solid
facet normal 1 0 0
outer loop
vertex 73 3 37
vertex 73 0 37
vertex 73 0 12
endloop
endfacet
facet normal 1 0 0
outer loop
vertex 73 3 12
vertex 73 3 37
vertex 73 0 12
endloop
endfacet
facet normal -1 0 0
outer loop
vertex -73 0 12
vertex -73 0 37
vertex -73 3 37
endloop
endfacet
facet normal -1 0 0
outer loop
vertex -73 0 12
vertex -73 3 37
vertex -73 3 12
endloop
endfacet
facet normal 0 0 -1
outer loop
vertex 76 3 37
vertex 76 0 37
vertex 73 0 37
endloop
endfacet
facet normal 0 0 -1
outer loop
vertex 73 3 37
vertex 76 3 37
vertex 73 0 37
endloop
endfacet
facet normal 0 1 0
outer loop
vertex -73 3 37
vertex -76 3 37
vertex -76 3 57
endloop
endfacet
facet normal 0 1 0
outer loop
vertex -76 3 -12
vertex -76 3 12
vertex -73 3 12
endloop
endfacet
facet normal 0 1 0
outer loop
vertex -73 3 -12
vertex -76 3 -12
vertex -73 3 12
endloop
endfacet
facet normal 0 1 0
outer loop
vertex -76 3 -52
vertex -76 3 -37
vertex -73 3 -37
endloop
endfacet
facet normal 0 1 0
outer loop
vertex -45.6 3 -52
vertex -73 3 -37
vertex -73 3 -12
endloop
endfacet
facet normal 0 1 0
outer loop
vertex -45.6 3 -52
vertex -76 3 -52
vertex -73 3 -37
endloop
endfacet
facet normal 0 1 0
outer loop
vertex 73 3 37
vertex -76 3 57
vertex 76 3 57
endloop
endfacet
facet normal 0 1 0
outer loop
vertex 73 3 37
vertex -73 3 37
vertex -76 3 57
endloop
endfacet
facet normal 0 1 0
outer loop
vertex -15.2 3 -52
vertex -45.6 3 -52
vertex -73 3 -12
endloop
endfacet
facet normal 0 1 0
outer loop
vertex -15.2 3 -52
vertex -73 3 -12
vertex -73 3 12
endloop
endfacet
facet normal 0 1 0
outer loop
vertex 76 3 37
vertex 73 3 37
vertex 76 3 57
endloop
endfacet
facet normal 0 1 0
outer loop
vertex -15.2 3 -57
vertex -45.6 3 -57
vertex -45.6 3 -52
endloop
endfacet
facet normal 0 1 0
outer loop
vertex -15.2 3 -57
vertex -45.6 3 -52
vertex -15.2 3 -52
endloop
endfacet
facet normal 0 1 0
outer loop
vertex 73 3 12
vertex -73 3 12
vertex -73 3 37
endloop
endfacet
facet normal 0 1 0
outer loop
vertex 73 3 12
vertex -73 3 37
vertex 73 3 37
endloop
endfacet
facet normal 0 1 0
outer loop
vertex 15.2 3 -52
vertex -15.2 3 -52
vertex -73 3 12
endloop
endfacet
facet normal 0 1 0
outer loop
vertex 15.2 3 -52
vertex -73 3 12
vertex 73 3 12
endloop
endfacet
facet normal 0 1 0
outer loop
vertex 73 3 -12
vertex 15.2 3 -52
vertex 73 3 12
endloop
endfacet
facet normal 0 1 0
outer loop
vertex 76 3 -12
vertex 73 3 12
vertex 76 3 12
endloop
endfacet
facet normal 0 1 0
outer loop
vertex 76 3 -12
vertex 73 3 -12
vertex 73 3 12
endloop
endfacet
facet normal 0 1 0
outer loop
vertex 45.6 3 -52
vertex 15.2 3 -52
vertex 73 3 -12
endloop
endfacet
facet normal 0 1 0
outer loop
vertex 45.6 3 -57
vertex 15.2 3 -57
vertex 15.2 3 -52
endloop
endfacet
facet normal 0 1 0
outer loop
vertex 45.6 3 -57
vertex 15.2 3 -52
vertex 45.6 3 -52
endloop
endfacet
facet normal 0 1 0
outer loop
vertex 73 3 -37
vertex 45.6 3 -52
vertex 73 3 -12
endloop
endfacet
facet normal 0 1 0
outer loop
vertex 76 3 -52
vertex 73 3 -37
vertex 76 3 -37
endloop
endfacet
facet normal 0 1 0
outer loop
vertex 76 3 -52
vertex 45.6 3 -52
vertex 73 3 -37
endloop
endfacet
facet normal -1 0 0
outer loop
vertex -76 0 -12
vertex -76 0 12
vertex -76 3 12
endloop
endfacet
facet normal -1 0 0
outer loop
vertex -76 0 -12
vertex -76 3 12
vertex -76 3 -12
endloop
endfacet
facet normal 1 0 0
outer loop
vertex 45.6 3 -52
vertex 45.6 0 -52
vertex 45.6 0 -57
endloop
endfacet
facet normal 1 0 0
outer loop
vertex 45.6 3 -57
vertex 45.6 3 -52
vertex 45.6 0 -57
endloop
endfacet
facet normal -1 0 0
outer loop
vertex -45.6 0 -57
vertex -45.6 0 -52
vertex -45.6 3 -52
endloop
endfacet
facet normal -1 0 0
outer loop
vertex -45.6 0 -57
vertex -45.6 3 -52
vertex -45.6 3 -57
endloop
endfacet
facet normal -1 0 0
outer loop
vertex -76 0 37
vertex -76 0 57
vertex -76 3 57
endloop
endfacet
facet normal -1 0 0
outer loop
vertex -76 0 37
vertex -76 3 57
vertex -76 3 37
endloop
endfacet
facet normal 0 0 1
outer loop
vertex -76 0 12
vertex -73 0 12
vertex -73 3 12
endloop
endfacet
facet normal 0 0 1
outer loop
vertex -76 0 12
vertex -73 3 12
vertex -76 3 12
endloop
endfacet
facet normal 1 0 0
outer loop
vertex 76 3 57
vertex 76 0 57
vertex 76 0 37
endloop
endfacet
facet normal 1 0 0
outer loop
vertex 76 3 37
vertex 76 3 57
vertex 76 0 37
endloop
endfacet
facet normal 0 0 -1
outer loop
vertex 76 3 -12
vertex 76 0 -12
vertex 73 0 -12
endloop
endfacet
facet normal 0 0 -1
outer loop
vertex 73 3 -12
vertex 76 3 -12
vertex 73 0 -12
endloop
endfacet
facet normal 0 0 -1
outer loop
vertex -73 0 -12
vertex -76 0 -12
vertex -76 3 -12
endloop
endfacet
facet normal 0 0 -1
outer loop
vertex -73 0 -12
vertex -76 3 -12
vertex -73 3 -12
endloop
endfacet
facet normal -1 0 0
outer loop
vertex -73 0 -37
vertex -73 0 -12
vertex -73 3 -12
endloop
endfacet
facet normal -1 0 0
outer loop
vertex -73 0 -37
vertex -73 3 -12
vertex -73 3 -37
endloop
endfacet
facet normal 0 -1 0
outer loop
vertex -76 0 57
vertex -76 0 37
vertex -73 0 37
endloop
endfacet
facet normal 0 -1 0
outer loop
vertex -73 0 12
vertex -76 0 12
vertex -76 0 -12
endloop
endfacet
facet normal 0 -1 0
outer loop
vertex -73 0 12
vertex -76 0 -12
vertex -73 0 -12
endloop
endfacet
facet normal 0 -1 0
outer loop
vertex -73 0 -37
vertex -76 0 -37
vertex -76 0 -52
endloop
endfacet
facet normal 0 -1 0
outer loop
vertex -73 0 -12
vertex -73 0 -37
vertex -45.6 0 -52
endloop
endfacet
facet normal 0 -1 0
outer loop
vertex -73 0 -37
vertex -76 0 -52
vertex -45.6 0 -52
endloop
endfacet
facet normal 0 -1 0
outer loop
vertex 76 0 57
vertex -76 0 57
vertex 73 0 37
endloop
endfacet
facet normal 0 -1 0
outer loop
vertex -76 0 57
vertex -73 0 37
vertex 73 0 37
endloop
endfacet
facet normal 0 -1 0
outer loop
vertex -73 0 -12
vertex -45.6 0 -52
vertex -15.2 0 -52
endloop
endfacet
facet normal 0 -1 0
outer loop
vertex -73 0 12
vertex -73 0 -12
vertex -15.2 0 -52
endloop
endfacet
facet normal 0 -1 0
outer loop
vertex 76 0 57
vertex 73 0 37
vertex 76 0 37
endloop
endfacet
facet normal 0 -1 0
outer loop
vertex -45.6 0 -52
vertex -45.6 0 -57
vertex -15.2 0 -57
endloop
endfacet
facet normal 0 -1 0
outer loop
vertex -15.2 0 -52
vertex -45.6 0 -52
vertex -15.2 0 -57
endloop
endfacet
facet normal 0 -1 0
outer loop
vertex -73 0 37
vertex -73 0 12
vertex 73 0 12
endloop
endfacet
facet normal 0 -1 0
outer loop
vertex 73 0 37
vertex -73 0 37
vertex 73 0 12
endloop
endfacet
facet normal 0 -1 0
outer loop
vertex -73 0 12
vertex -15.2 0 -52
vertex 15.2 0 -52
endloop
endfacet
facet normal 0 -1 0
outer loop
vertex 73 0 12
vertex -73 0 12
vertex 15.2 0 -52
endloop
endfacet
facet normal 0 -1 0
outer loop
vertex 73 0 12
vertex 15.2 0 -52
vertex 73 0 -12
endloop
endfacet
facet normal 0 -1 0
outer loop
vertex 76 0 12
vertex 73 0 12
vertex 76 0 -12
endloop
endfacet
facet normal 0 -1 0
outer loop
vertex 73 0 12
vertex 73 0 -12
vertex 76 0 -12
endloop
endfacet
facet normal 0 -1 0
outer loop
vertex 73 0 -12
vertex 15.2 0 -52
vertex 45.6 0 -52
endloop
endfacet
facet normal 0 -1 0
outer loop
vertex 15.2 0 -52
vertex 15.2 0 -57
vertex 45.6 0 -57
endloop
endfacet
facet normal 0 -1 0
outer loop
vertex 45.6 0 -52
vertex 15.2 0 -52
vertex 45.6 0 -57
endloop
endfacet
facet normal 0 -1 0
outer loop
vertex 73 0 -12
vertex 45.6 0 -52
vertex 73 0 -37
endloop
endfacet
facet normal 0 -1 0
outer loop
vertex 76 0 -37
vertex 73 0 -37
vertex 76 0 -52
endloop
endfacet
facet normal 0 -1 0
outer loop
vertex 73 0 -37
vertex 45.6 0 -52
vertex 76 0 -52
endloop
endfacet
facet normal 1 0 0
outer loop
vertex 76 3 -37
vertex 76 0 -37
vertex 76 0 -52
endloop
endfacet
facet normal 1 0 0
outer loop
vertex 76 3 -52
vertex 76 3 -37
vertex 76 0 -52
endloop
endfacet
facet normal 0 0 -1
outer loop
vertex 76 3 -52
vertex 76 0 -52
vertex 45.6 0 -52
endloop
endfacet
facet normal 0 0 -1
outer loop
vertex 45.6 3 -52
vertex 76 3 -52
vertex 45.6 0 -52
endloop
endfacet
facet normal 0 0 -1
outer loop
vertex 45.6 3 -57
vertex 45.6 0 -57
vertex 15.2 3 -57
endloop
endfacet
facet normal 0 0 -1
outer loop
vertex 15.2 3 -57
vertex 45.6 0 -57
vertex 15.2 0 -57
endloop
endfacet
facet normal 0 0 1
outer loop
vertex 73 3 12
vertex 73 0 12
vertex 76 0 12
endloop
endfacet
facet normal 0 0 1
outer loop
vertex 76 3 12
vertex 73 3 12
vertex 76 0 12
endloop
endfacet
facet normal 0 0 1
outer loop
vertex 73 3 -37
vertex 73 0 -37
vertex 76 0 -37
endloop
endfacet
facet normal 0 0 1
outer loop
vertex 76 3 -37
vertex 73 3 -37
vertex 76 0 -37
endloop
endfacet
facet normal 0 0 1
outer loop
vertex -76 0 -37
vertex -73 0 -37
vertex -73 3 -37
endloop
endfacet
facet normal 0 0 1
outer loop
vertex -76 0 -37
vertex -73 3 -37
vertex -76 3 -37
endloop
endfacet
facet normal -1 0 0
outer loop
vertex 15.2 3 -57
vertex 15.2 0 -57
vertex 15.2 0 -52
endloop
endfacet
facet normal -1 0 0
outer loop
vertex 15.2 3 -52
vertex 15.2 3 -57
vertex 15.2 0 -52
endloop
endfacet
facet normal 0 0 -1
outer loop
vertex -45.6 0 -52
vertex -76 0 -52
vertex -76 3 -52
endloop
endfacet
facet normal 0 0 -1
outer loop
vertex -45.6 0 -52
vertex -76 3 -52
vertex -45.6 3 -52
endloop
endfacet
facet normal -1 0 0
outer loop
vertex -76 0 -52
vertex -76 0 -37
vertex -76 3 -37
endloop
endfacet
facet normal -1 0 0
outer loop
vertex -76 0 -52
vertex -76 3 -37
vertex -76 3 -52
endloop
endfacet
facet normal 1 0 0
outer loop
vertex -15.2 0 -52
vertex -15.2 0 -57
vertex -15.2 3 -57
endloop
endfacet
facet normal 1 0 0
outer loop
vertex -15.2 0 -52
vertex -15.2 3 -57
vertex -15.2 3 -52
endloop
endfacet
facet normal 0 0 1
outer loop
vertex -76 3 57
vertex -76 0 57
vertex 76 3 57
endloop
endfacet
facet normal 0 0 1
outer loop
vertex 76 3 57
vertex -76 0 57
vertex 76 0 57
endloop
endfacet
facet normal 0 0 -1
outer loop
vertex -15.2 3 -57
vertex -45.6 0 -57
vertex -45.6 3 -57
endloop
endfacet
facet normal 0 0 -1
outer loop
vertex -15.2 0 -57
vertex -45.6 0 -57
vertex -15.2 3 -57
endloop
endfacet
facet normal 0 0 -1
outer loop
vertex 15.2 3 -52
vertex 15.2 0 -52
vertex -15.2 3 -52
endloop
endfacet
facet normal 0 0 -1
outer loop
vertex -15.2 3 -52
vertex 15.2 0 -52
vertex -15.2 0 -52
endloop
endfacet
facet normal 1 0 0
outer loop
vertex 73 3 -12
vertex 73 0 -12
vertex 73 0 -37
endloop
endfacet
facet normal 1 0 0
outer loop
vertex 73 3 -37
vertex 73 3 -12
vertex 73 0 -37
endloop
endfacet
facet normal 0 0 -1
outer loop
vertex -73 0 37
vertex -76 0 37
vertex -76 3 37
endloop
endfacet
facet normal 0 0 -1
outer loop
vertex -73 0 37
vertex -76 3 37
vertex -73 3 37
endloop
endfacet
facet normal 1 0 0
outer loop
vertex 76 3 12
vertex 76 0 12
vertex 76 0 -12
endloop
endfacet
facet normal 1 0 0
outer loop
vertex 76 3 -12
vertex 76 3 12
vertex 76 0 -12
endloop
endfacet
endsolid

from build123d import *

# Parameters (mm, degrees)
BOSS_EXTRUDE1_DEPTH = 3


with BuildPart() as part:
    # Sketch1 → Boss-Extrude1 (new body)
    with BuildSketch(Plane(origin=(0, 0, 0), x_dir=(1, 0, 0), z_dir=(0, 1, 0))):
        Polygon((0, 52), (0, -57), (-76, -57), (-76, -37), (-73, -37), (-73, -12), (-76, -12), (-76, 12), (-73, 12), (-73, 37), (-76, 37), (-76, 52), (-45.6, 52), (-45.6, 57), (-15.2, 57), (-15.2, 52), align=None)
    boss_extrude1 = extrude(amount=BOSS_EXTRUDE1_DEPTH)

    # Mirror1: Boss-Extrude1 across plane
    add(boss_extrude1.mirror(Plane(origin=(0, 3, -52), x_dir=(0, 0, 1), z_dir=(-1, 0, 0))))


solid = part.part
